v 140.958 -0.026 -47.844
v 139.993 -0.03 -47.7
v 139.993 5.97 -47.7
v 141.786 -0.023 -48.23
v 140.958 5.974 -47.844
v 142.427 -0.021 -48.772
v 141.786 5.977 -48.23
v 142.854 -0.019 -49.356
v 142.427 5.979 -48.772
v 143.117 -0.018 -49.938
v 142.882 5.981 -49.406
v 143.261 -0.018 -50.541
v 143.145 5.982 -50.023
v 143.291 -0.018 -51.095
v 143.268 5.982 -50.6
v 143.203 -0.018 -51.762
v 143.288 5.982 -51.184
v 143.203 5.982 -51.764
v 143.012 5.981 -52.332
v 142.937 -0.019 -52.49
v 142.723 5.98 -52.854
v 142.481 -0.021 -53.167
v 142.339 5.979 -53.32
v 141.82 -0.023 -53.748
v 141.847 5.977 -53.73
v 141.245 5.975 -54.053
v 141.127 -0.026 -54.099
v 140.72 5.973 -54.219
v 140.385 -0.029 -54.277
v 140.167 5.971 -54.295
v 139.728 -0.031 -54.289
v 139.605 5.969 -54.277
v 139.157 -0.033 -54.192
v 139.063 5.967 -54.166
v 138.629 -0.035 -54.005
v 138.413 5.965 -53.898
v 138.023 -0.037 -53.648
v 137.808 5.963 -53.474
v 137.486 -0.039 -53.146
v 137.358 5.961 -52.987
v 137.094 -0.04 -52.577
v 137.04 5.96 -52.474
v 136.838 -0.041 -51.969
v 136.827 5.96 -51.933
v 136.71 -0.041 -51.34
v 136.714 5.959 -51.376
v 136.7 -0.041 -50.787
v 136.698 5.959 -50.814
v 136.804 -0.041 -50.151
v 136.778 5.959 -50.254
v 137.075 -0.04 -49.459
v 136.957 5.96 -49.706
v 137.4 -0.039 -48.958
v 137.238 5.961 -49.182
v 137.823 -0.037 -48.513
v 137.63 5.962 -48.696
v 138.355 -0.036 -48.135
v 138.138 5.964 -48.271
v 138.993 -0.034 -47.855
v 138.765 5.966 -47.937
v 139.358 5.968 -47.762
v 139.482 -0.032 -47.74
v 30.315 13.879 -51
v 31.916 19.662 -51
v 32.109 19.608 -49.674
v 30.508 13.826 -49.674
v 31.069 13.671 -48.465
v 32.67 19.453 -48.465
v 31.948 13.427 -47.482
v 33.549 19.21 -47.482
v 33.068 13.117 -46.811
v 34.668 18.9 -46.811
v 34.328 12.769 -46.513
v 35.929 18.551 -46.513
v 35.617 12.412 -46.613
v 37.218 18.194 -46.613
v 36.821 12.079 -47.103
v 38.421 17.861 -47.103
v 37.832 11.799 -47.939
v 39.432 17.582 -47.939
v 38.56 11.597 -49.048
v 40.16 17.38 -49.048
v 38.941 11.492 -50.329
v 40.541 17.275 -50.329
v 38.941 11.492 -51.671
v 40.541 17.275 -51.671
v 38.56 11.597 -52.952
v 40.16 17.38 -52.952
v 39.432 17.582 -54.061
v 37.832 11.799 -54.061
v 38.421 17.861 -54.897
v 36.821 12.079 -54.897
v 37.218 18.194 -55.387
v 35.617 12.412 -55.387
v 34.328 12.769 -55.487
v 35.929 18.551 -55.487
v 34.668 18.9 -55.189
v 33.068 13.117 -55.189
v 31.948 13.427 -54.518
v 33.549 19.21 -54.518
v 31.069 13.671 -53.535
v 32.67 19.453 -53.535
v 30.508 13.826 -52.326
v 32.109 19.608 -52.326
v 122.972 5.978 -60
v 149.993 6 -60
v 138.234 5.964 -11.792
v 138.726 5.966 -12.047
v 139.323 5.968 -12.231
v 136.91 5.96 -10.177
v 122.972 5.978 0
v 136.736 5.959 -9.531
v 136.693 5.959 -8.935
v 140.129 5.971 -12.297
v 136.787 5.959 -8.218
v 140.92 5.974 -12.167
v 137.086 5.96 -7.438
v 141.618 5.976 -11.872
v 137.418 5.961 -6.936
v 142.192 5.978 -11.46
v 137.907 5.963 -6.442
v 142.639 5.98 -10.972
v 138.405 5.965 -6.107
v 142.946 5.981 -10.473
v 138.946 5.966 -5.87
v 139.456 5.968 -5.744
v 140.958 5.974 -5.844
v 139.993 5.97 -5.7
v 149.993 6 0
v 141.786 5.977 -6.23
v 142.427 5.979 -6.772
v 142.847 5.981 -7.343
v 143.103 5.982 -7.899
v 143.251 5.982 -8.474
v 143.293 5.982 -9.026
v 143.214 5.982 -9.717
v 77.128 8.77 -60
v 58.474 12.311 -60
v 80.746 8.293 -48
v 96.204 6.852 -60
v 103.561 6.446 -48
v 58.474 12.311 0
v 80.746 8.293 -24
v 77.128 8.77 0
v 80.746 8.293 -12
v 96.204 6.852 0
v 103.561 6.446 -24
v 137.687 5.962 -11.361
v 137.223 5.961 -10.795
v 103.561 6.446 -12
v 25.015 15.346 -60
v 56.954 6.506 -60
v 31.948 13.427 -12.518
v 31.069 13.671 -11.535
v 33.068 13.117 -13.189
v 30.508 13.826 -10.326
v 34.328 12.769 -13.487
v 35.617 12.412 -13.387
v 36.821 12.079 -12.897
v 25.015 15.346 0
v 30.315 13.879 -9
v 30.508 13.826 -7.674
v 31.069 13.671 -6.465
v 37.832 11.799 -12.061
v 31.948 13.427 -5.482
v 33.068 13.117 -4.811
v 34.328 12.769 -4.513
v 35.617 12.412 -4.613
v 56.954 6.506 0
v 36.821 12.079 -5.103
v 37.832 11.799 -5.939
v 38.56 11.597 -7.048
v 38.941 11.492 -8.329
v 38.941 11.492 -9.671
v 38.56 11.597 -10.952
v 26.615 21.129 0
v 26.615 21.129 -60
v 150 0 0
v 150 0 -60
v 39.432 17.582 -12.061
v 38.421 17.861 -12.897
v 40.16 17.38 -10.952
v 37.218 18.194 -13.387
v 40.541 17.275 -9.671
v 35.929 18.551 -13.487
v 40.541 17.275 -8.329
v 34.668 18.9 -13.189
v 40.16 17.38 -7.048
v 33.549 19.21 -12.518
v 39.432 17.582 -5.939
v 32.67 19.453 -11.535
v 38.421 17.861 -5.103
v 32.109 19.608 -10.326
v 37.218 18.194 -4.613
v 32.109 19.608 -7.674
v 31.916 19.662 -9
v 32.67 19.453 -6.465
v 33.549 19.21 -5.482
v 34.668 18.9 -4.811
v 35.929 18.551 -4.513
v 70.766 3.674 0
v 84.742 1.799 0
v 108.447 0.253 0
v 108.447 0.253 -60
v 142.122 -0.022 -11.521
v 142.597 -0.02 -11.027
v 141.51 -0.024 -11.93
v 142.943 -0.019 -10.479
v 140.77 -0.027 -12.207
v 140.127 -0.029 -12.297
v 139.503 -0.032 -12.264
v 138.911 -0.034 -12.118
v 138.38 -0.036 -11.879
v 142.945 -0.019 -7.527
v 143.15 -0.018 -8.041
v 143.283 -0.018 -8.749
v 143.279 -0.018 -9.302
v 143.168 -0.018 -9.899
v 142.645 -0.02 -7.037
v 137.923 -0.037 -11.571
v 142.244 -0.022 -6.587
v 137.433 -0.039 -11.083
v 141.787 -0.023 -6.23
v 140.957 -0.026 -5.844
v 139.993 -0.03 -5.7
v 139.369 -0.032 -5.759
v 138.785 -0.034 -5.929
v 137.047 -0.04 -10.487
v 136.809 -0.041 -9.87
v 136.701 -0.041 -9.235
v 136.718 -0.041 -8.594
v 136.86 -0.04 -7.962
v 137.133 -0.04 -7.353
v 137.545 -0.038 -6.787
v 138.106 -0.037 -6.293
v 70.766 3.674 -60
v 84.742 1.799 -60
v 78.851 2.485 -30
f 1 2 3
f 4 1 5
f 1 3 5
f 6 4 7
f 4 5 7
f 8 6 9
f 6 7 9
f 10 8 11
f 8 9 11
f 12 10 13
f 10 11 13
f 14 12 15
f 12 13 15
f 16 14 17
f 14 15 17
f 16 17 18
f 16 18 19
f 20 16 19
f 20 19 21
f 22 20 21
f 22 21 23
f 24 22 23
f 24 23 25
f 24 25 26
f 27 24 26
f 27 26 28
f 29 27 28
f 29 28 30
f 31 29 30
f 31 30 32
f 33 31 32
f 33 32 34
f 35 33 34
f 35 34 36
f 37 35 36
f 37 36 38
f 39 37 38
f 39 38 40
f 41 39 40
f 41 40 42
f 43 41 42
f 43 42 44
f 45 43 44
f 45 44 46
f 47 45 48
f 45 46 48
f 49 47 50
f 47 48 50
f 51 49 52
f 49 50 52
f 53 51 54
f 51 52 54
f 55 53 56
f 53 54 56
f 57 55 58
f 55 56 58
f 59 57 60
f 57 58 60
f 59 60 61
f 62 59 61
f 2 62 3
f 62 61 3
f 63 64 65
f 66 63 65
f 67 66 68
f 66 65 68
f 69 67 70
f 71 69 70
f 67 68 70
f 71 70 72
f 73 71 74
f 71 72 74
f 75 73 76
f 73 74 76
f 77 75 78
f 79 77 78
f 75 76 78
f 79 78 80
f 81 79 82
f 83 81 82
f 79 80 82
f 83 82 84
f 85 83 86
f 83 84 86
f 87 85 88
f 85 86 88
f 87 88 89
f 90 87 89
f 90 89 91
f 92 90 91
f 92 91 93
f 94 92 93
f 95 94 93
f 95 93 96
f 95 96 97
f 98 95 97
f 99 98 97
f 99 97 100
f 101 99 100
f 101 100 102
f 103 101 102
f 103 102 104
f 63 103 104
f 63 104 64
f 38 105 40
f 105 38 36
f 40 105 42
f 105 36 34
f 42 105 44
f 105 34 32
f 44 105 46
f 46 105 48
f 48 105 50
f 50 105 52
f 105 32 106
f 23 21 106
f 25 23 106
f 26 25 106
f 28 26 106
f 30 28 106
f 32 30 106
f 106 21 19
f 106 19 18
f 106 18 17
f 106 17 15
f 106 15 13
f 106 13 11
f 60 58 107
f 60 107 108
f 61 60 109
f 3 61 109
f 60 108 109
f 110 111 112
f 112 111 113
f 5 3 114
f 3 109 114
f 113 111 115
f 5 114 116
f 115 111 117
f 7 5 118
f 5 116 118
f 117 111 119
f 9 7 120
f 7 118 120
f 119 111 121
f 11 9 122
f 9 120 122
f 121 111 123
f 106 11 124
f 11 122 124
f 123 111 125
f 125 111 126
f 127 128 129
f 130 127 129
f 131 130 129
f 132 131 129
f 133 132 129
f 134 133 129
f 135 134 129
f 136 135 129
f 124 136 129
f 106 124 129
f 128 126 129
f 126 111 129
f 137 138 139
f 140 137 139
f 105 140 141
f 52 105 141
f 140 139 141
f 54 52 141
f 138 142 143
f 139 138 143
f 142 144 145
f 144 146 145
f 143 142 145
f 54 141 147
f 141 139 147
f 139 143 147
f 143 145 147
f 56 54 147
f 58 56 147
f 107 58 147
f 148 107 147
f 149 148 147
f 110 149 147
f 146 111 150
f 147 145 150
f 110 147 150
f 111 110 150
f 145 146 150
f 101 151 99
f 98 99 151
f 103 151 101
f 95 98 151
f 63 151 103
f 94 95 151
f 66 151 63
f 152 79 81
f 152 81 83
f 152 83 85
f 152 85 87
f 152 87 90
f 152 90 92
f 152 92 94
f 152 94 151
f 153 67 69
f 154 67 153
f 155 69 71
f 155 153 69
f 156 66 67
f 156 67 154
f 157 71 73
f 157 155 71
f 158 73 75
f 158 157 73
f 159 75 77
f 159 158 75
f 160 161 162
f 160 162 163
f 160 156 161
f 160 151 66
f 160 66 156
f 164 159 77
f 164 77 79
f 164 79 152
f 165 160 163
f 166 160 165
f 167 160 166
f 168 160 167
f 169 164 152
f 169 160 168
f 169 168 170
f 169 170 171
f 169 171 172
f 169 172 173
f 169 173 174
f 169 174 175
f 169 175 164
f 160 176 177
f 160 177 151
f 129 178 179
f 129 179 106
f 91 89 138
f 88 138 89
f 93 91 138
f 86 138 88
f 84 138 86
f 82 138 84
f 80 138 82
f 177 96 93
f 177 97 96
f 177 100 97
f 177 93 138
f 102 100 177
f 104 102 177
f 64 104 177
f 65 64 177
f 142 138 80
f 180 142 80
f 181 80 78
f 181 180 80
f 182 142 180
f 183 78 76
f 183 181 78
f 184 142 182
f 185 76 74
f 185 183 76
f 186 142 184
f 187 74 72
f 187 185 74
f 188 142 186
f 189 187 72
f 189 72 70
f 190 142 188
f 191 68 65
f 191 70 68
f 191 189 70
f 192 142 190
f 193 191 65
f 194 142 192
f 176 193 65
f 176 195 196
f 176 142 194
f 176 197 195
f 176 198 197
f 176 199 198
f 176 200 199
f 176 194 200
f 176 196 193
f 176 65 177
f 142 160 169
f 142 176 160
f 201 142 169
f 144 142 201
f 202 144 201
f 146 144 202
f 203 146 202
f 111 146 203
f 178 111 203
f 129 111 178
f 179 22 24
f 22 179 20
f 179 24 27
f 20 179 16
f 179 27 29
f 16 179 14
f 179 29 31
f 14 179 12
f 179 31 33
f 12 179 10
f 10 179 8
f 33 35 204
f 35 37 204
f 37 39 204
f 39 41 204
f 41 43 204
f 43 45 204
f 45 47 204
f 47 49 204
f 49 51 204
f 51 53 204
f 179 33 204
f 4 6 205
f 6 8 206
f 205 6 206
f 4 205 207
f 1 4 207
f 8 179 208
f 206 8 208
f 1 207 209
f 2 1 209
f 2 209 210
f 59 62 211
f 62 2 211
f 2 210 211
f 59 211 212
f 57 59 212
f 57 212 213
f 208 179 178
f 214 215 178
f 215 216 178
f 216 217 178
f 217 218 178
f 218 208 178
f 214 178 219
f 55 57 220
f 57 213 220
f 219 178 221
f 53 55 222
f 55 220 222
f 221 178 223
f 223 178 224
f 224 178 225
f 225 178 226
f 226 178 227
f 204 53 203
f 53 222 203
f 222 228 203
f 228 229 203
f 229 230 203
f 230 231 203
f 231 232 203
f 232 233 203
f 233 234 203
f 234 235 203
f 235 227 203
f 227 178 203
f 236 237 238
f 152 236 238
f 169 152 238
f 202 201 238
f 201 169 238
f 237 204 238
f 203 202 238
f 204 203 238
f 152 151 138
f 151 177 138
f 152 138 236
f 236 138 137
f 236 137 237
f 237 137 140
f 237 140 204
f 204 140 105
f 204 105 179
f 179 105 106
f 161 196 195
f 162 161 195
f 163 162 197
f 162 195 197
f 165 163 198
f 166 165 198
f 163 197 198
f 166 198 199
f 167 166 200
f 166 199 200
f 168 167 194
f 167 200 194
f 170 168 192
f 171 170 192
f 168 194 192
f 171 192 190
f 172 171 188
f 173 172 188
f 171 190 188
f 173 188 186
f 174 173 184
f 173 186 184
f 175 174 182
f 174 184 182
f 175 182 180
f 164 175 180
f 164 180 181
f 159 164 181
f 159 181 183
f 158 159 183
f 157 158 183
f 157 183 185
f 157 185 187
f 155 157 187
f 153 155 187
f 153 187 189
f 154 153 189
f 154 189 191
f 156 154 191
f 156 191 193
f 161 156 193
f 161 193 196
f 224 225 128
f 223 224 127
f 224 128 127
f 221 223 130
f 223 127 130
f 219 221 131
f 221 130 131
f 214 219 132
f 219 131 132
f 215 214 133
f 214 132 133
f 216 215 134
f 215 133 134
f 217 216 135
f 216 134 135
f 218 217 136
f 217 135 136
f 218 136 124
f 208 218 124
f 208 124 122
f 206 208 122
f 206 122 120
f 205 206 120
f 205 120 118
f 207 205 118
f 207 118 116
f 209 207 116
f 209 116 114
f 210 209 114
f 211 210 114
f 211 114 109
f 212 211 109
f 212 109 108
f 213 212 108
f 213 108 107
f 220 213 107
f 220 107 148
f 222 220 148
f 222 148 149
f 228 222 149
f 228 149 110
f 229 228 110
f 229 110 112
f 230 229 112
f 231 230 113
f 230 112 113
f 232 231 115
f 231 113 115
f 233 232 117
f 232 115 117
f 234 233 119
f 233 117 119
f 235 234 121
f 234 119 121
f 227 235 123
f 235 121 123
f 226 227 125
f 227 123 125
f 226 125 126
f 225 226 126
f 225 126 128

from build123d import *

# Parameters (mm, degrees)
ESTRUSIONE_ESTRUSIONE1_DEPTH = 60
SCHIZZO2_R                   = 3.3
TAGLIO_ESTRUSIONE1_DEPTH     = 163.261772004
SCHIZZO3_R                   = 4.5
TAGLIO_ESTRUSIONE2_DEPTH     = 158.032602074


with BuildPart() as part:
    # Schizzo1 → Estrusione-Estrusione1 (new body)
    with BuildSketch(Plane.XY):
        with BuildLine():
            Line((25.014752149, 15.346258777), (56.954134442, 6.506400743))
            add(Edge.make_bspline(
                [(150, 0), (126.370664176, -0.028998352), (94.908093193, -0.705091299), (64.163963919, 4.724970041), (56.954134442, 6.506400743)],
                knots=[0, 0, 0, 0, 0.761803866, 1, 1, 1, 1], degree=3))
            Line((150, 0), (149.992636696, 5.999995482))
            add(Edge.make_bspline(
                [(58.473520543, 12.311445177), (62.126468599, 11.410871011), (69.480954345, 9.870901955), (84.475289112, 7.646971822), (103.507977373, 6.219278985), (126.666543406, 5.867237142), (142.227417194, 5.990465863), (149.992636696, 5.999995482)],
                knots=[0, 0, 0, 0, 0.124885495, 0.24977099, 0.49954198, 0.74931297, 0.99908396, 0.99908396, 0.99908396, 0.99908396], degree=3))
            Line((58.473520543, 12.311445177), (26.615203686, 21.128866742))
            Line((26.615203686, 21.128866742), (25.014752149, 15.346258777))
        make_face()
    extrude(amount=-ESTRUSIONE_ESTRUSIONE1_DEPTH)

    # Schizzo2 → Taglio-Estrusione1 (cut, through all)
    with BuildSketch(Plane(origin=(0, 6, 0), x_dir=(1, 0, 0), z_dir=(0, 1, 0))):
        with Locations(Location((139.992636696, 51, 0), (0, 0, 270))):
            Circle(SCHIZZO2_R)
        with Locations(Location((139.992636696, 9, 0), (0, 0, 270))):
            Circle(SCHIZZO2_R)
    extrude(amount=-TAGLIO_ESTRUSIONE1_DEPTH, mode=Mode.SUBTRACT)

    # Schizzo3 → Taglio-Estrusione2 (cut, through all)
    with BuildSketch(Plane(origin=(7.325457705, 26.467686836, 0), x_dir=(0.9637679941855859, -0.26674192280834413, 0), z_dir=(0.2667419228083441, 0.9637679941855858, 0))):
        with Locations(Location((30.01492693, 51, 0), (0, 0, 180))):
            Circle(SCHIZZO3_R)
        with Locations(Location((30.01492693, 9, 0), (0, 0, 180))):
            Circle(SCHIZZO3_R)
    extrude(amount=-TAGLIO_ESTRUSIONE2_DEPTH, mode=Mode.SUBTRACT)


solid = part.part
